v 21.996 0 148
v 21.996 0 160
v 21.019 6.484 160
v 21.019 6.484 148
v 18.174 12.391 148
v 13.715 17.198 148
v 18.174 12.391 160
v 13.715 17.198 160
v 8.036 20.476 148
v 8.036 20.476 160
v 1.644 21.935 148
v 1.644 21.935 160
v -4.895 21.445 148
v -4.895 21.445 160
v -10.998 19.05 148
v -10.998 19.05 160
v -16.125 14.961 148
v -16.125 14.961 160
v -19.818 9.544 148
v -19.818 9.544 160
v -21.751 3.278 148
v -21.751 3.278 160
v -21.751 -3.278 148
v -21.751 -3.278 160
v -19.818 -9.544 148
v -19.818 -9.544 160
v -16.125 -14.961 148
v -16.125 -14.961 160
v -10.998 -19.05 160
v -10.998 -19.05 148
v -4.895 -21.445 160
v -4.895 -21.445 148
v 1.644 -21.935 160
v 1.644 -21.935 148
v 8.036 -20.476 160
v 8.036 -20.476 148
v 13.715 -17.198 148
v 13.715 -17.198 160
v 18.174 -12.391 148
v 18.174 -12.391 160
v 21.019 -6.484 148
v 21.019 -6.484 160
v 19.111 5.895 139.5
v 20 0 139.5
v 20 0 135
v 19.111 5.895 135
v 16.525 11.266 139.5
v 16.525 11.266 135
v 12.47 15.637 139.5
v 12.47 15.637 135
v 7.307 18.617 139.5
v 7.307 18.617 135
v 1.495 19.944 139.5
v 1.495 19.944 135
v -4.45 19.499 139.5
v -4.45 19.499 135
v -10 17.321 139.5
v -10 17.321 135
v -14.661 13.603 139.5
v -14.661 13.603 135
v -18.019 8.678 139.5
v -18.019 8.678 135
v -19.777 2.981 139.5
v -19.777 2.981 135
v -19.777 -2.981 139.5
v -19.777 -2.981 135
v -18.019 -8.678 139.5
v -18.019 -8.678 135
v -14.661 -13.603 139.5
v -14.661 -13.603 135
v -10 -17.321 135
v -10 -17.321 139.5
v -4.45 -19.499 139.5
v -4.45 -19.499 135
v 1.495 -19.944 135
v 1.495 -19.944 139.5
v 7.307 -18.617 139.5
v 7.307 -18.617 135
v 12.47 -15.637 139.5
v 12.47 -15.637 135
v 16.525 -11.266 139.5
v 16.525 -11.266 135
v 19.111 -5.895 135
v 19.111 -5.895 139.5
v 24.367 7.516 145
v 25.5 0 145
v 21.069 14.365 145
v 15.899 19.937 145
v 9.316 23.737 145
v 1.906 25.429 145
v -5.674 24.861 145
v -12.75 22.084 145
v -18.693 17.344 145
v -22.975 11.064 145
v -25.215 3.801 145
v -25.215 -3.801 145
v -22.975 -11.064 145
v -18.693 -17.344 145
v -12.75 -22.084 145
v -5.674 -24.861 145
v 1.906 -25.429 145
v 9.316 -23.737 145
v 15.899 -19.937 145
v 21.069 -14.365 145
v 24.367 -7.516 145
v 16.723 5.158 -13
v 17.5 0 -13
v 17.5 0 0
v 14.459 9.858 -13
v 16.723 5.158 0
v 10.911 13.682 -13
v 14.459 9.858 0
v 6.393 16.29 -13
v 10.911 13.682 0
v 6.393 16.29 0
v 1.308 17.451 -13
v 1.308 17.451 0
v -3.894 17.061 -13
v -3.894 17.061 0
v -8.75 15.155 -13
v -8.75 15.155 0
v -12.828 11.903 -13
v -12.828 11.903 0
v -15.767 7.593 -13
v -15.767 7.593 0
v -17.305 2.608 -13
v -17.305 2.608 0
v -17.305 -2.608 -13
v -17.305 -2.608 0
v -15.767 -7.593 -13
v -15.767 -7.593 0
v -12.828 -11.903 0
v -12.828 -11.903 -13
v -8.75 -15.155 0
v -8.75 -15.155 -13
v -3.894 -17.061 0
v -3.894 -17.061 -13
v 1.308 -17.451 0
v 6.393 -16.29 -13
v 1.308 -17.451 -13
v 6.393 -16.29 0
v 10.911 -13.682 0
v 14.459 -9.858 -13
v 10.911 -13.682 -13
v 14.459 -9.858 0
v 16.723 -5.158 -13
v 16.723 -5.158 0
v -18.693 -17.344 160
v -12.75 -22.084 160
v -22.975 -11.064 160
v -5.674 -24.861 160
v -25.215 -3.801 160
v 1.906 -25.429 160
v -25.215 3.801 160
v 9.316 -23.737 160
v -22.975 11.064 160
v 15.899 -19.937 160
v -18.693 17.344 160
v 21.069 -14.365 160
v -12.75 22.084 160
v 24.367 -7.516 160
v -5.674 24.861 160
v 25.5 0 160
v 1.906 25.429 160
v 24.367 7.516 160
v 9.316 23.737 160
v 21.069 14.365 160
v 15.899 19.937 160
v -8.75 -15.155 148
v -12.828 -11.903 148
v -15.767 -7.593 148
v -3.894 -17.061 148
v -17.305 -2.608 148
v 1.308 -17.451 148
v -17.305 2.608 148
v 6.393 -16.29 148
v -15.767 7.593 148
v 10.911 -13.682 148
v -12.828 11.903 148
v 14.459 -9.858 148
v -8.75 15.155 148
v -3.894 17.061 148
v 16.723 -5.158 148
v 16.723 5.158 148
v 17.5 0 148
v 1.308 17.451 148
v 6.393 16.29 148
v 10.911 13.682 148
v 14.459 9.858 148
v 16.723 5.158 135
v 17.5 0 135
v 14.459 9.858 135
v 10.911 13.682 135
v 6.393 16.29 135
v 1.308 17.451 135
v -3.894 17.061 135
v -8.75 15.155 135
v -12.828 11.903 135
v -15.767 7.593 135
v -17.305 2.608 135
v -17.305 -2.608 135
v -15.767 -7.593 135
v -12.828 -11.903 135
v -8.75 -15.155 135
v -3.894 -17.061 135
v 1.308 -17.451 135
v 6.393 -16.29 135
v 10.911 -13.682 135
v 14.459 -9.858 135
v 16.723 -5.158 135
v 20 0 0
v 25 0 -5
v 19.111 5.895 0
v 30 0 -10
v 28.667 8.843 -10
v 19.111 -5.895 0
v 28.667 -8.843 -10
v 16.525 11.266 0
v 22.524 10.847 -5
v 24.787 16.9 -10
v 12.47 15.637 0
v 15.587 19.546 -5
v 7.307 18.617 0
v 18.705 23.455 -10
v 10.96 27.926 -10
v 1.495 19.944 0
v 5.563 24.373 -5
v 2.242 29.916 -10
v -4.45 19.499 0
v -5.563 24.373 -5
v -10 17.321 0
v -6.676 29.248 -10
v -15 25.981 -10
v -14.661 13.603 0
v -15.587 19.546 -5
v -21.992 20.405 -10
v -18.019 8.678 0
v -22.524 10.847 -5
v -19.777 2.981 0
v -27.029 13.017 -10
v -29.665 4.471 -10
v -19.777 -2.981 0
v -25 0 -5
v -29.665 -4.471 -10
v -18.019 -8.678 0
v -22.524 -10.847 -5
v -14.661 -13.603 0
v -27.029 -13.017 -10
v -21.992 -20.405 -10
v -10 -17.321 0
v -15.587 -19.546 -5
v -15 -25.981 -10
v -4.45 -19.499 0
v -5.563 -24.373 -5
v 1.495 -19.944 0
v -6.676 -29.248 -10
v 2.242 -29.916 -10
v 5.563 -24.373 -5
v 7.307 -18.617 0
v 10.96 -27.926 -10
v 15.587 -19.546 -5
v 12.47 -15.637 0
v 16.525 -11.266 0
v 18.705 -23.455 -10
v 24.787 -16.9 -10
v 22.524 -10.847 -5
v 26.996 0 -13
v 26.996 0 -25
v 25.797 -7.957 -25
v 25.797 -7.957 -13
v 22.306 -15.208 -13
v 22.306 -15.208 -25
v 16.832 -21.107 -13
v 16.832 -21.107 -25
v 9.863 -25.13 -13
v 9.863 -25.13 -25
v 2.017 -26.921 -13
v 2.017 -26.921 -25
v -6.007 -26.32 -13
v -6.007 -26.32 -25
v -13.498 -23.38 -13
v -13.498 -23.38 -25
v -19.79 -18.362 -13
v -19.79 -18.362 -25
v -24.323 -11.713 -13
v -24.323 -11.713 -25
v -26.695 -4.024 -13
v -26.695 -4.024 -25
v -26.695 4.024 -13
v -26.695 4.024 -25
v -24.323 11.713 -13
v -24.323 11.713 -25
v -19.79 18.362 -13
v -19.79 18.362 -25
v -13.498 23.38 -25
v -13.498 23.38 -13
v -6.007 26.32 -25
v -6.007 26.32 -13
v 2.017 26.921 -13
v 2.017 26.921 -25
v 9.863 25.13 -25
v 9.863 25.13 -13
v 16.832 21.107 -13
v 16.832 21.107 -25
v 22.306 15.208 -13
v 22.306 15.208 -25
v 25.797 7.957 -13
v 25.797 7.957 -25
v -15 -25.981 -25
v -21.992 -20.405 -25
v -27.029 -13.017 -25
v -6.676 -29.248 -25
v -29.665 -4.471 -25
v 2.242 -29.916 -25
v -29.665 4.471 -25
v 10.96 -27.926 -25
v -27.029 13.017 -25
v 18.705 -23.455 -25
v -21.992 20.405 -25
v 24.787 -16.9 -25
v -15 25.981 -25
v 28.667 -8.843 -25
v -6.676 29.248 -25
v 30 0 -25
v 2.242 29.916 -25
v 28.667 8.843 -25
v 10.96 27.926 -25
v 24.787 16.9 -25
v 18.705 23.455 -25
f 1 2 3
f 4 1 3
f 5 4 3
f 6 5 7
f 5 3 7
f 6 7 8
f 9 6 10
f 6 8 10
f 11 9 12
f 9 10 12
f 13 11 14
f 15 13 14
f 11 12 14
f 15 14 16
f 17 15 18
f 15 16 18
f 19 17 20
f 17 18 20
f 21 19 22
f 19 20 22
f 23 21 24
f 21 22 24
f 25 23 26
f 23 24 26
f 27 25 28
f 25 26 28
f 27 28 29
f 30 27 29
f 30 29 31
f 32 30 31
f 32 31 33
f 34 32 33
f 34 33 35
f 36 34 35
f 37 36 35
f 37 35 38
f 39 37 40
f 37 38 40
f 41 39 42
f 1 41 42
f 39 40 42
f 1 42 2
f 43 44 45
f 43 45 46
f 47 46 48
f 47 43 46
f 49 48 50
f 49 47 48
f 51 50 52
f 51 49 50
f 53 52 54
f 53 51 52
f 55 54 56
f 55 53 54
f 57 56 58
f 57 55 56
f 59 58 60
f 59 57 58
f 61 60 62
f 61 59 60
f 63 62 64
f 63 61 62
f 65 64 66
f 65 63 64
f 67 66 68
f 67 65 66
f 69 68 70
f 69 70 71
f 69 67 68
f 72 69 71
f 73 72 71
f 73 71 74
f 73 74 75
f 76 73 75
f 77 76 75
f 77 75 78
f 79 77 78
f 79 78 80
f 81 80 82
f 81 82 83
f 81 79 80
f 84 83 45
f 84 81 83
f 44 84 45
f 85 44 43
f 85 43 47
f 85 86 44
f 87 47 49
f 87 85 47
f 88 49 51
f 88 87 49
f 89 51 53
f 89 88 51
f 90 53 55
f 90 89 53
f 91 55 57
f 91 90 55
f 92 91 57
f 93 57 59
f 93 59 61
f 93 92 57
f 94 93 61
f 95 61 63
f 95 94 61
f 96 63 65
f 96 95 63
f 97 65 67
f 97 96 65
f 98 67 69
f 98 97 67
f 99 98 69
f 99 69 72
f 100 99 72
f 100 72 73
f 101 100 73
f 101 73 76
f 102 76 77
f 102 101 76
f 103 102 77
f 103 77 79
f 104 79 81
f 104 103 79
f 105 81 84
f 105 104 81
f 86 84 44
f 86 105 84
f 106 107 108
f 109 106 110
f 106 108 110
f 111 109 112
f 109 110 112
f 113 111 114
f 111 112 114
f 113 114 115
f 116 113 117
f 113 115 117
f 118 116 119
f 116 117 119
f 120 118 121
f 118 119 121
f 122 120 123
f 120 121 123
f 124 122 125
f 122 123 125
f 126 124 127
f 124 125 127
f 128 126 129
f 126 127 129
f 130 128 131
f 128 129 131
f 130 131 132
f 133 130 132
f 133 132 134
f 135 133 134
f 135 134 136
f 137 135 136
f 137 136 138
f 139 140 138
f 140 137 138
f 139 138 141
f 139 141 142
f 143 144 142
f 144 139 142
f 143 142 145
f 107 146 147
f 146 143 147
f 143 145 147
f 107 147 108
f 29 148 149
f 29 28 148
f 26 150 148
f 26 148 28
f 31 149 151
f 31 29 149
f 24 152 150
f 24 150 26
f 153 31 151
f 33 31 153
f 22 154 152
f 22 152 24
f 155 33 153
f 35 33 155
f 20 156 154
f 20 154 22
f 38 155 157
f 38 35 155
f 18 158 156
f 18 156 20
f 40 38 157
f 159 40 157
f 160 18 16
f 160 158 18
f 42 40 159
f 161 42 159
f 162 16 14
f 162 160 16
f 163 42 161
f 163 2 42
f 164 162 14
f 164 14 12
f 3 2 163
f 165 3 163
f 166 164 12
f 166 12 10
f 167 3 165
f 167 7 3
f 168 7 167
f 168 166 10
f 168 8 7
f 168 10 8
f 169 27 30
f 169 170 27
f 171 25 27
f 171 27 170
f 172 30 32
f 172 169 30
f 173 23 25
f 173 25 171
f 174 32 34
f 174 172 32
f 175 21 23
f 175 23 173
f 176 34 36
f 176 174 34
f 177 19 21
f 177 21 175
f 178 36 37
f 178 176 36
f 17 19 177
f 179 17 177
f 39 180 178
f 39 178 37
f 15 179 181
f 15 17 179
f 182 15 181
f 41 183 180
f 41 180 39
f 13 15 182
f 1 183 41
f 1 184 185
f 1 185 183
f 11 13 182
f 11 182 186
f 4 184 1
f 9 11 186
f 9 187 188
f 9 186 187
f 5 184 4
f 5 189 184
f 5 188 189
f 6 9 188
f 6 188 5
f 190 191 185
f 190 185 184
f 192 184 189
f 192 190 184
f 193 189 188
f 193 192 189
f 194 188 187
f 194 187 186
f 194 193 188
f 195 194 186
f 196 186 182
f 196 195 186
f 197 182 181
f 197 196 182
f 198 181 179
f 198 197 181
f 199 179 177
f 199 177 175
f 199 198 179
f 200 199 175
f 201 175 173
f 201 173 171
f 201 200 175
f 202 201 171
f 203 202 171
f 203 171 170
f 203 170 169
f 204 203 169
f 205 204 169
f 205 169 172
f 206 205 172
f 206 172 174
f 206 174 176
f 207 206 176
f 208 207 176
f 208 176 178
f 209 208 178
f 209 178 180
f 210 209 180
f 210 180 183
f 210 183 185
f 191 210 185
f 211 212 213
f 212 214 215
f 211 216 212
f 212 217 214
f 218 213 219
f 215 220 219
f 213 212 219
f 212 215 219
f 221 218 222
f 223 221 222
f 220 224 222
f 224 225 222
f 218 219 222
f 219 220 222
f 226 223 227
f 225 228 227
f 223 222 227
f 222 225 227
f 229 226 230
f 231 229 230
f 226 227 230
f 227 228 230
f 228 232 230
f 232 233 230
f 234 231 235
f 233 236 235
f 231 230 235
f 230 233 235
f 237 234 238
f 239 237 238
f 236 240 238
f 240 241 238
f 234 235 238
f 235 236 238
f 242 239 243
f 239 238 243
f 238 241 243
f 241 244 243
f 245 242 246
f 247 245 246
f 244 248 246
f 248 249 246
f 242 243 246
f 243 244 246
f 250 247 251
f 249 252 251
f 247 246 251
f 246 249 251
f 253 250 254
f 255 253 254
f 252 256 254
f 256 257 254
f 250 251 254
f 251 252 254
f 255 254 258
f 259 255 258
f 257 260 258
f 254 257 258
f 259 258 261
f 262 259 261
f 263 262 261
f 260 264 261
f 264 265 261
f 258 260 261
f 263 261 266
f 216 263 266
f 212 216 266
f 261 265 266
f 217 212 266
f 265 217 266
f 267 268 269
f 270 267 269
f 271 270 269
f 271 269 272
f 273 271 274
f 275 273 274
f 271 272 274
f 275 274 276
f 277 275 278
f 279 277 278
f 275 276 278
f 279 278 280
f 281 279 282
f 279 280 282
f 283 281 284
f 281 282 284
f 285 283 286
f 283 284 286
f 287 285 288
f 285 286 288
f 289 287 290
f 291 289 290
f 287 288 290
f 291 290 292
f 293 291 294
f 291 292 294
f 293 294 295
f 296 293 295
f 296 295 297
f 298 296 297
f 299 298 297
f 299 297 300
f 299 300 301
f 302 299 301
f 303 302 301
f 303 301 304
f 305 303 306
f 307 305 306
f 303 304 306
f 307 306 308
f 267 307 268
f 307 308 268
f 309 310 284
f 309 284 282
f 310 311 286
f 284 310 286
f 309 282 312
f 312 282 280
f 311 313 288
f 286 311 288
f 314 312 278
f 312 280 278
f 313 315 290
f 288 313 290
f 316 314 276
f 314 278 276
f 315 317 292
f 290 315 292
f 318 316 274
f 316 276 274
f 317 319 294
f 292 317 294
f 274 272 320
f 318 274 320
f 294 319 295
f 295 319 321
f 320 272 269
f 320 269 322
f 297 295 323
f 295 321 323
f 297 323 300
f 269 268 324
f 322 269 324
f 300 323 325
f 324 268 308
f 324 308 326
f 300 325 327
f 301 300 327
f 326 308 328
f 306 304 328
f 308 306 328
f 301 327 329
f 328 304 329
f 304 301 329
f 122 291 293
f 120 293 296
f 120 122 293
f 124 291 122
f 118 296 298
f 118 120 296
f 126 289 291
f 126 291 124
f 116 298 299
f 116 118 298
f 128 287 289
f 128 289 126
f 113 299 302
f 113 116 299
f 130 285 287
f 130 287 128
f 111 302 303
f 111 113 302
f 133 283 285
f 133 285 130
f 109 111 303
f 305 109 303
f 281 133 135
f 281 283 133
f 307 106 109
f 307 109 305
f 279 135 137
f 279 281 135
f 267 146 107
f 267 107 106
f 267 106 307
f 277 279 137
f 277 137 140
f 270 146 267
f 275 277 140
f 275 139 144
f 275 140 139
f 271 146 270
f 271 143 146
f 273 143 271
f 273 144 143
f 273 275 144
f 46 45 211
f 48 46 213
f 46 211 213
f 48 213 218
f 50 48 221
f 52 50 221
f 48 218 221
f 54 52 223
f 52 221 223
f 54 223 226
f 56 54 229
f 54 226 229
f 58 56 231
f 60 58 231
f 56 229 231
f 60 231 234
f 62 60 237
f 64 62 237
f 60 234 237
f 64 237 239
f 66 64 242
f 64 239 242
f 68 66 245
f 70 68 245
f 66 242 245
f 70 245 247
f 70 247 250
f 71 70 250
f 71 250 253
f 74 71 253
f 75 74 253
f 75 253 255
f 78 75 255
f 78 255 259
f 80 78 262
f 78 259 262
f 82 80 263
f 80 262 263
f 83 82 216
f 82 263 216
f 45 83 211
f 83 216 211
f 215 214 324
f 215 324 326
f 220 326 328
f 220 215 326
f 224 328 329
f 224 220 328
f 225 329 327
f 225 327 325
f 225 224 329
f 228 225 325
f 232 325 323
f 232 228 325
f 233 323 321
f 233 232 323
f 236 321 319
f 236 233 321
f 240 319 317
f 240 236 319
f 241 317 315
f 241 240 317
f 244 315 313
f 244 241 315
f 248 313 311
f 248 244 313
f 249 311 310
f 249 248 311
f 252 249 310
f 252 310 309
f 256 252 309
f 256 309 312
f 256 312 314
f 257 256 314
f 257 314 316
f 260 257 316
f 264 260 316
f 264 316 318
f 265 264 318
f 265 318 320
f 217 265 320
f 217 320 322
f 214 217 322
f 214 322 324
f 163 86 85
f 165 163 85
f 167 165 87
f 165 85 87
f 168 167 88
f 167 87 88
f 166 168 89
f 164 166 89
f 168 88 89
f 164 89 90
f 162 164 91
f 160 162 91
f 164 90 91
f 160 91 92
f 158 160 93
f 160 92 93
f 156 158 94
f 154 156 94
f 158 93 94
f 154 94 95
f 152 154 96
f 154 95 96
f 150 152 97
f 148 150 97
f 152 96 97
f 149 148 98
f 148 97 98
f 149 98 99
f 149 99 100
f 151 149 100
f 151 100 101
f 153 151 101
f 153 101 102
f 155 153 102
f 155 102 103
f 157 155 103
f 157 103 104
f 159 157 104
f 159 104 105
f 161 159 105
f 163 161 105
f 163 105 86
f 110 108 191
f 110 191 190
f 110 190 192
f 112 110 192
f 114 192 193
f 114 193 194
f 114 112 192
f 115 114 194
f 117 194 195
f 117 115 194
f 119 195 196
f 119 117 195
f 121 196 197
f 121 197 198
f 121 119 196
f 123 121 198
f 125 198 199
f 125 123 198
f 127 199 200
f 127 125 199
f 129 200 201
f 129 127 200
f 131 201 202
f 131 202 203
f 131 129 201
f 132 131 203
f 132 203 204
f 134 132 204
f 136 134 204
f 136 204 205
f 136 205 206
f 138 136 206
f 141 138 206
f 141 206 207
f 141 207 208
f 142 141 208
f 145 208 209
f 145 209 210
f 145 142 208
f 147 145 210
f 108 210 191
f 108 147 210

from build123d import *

# Parameters (mm, degrees)
F0_R          = 20
F0_R_2        = 17.5
F1_DEPTH      = 135
F2_R          = 30
F2_R_2        = 26.9985
F2_R_3        = 17.5
F3_DEPTH      = 25
F4_R          = 26.9965
F4_R_2        = 24
F4_R_3        = 17.5
F5_DEPTH      = 12
F6_R          = 25.5
F6_R_2        = 22.4965
F6_R_3        = 20
F6_R_4        = 17.5
F7_DEPTH      = 25
F8_R          = 21.9965
F8_R_2        = 17.5
F9_DEPTH      = 12
F10_S5_R      = 20
F10_T6_DEPTH  = 38
F10_S11_R     = 20
F10_T12_DEPTH = 44


# Not quite as in the source:
# - a fillet or chamfer that OpenCascade refuses, or shapes differently, is made with other operations: its cross-section is extruded or revolved along the edge and cut away or added


with BuildPart() as f1:
    # F0 (on Top) → F1 (new body)
    with BuildSketch(Plane.XY):
        Circle(F0_R)
        Circle(F0_R_2, mode=Mode.SUBTRACT)
    extrude(amount=F1_DEPTH)

    # F2 (on Top) → F3 (join)
    with BuildSketch(Plane.XY):
        Circle(F2_R)
        Circle(F2_R_2, mode=Mode.SUBTRACT)
        Circle(F2_R_2)
        Circle(F2_R_3, mode=Mode.SUBTRACT)
    extrude(amount=-F3_DEPTH)

    # F4 (on face) → F5 (cut)
    with BuildSketch(Plane(origin=(0, 0, -25), x_dir=(1, 0, 0), z_dir=(0, 0, -1))):
        Circle(F4_R)
        Circle(F4_R_2, mode=Mode.SUBTRACT)
        Circle(F4_R_2)
        Circle(F4_R_3, mode=Mode.SUBTRACT)
    extrude(amount=-F5_DEPTH, mode=Mode.SUBTRACT)

    # F6 (on face) → F7 (join)
    with BuildSketch(Plane.XY.offset(135)):
        Circle(F6_R)
        Circle(F6_R_2, mode=Mode.SUBTRACT)
        Circle(F6_R_2)
        Circle(F6_R_3, mode=Mode.SUBTRACT)
        Circle(F6_R_3)
        Circle(F6_R_4, mode=Mode.SUBTRACT)
    extrude(amount=F7_DEPTH)

    # F8 (on face) → F9 (cut)
    with BuildSketch(Plane.XY.offset(160)):
        Circle(F8_R)
        Circle(F8_R_2, mode=Mode.SUBTRACT)
    extrude(amount=-F9_DEPTH, mode=Mode.SUBTRACT)

    # F10: chamfer of 10 on 2 edges, made by hand


with BuildPart() as f10_tool2:
    # F10_s3 → F10_t4 (revolve)
    with BuildSketch(Plane.XZ):
        Polygon((15.5, 135), (25.5, 145), (25.5, 135), align=None)
    revolve(axis=Axis((0, 0, 135), (0, 0, 1)))

    # F10_s5 → F10_t6 (cut, symmetric)
    with BuildSketch(Plane.XY.offset(140)):
        Circle(F10_S5_R)
    extrude(amount=F10_T6_DEPTH, both=True, mode=Mode.SUBTRACT)


with BuildPart() as f1_1:
    add(f1.part)

    # F10_t1: cut F10_tool2
    add(f10_tool2.part, mode=Mode.SUBTRACT)


with BuildPart() as f10_tool8:
    # F10_s9 → F10_t10 (revolve)
    with BuildSketch(Plane.XZ):
        Polygon((20, 0), (30, -10), (30, 0), align=None)
    revolve(axis=Axis((0, 0, 0), (0, 0, 1)))

    # F10_s11 → F10_t12 (cut, symmetric)
    with BuildSketch(Plane.XY.offset(-5)):
        Circle(F10_S11_R)
    extrude(amount=F10_T12_DEPTH, both=True, mode=Mode.SUBTRACT)


with BuildPart() as f1_2:
    add(f1_1.part)

    # F10_t7: cut F10_tool8
    add(f10_tool8.part, mode=Mode.SUBTRACT)


solid = f1_2.part
